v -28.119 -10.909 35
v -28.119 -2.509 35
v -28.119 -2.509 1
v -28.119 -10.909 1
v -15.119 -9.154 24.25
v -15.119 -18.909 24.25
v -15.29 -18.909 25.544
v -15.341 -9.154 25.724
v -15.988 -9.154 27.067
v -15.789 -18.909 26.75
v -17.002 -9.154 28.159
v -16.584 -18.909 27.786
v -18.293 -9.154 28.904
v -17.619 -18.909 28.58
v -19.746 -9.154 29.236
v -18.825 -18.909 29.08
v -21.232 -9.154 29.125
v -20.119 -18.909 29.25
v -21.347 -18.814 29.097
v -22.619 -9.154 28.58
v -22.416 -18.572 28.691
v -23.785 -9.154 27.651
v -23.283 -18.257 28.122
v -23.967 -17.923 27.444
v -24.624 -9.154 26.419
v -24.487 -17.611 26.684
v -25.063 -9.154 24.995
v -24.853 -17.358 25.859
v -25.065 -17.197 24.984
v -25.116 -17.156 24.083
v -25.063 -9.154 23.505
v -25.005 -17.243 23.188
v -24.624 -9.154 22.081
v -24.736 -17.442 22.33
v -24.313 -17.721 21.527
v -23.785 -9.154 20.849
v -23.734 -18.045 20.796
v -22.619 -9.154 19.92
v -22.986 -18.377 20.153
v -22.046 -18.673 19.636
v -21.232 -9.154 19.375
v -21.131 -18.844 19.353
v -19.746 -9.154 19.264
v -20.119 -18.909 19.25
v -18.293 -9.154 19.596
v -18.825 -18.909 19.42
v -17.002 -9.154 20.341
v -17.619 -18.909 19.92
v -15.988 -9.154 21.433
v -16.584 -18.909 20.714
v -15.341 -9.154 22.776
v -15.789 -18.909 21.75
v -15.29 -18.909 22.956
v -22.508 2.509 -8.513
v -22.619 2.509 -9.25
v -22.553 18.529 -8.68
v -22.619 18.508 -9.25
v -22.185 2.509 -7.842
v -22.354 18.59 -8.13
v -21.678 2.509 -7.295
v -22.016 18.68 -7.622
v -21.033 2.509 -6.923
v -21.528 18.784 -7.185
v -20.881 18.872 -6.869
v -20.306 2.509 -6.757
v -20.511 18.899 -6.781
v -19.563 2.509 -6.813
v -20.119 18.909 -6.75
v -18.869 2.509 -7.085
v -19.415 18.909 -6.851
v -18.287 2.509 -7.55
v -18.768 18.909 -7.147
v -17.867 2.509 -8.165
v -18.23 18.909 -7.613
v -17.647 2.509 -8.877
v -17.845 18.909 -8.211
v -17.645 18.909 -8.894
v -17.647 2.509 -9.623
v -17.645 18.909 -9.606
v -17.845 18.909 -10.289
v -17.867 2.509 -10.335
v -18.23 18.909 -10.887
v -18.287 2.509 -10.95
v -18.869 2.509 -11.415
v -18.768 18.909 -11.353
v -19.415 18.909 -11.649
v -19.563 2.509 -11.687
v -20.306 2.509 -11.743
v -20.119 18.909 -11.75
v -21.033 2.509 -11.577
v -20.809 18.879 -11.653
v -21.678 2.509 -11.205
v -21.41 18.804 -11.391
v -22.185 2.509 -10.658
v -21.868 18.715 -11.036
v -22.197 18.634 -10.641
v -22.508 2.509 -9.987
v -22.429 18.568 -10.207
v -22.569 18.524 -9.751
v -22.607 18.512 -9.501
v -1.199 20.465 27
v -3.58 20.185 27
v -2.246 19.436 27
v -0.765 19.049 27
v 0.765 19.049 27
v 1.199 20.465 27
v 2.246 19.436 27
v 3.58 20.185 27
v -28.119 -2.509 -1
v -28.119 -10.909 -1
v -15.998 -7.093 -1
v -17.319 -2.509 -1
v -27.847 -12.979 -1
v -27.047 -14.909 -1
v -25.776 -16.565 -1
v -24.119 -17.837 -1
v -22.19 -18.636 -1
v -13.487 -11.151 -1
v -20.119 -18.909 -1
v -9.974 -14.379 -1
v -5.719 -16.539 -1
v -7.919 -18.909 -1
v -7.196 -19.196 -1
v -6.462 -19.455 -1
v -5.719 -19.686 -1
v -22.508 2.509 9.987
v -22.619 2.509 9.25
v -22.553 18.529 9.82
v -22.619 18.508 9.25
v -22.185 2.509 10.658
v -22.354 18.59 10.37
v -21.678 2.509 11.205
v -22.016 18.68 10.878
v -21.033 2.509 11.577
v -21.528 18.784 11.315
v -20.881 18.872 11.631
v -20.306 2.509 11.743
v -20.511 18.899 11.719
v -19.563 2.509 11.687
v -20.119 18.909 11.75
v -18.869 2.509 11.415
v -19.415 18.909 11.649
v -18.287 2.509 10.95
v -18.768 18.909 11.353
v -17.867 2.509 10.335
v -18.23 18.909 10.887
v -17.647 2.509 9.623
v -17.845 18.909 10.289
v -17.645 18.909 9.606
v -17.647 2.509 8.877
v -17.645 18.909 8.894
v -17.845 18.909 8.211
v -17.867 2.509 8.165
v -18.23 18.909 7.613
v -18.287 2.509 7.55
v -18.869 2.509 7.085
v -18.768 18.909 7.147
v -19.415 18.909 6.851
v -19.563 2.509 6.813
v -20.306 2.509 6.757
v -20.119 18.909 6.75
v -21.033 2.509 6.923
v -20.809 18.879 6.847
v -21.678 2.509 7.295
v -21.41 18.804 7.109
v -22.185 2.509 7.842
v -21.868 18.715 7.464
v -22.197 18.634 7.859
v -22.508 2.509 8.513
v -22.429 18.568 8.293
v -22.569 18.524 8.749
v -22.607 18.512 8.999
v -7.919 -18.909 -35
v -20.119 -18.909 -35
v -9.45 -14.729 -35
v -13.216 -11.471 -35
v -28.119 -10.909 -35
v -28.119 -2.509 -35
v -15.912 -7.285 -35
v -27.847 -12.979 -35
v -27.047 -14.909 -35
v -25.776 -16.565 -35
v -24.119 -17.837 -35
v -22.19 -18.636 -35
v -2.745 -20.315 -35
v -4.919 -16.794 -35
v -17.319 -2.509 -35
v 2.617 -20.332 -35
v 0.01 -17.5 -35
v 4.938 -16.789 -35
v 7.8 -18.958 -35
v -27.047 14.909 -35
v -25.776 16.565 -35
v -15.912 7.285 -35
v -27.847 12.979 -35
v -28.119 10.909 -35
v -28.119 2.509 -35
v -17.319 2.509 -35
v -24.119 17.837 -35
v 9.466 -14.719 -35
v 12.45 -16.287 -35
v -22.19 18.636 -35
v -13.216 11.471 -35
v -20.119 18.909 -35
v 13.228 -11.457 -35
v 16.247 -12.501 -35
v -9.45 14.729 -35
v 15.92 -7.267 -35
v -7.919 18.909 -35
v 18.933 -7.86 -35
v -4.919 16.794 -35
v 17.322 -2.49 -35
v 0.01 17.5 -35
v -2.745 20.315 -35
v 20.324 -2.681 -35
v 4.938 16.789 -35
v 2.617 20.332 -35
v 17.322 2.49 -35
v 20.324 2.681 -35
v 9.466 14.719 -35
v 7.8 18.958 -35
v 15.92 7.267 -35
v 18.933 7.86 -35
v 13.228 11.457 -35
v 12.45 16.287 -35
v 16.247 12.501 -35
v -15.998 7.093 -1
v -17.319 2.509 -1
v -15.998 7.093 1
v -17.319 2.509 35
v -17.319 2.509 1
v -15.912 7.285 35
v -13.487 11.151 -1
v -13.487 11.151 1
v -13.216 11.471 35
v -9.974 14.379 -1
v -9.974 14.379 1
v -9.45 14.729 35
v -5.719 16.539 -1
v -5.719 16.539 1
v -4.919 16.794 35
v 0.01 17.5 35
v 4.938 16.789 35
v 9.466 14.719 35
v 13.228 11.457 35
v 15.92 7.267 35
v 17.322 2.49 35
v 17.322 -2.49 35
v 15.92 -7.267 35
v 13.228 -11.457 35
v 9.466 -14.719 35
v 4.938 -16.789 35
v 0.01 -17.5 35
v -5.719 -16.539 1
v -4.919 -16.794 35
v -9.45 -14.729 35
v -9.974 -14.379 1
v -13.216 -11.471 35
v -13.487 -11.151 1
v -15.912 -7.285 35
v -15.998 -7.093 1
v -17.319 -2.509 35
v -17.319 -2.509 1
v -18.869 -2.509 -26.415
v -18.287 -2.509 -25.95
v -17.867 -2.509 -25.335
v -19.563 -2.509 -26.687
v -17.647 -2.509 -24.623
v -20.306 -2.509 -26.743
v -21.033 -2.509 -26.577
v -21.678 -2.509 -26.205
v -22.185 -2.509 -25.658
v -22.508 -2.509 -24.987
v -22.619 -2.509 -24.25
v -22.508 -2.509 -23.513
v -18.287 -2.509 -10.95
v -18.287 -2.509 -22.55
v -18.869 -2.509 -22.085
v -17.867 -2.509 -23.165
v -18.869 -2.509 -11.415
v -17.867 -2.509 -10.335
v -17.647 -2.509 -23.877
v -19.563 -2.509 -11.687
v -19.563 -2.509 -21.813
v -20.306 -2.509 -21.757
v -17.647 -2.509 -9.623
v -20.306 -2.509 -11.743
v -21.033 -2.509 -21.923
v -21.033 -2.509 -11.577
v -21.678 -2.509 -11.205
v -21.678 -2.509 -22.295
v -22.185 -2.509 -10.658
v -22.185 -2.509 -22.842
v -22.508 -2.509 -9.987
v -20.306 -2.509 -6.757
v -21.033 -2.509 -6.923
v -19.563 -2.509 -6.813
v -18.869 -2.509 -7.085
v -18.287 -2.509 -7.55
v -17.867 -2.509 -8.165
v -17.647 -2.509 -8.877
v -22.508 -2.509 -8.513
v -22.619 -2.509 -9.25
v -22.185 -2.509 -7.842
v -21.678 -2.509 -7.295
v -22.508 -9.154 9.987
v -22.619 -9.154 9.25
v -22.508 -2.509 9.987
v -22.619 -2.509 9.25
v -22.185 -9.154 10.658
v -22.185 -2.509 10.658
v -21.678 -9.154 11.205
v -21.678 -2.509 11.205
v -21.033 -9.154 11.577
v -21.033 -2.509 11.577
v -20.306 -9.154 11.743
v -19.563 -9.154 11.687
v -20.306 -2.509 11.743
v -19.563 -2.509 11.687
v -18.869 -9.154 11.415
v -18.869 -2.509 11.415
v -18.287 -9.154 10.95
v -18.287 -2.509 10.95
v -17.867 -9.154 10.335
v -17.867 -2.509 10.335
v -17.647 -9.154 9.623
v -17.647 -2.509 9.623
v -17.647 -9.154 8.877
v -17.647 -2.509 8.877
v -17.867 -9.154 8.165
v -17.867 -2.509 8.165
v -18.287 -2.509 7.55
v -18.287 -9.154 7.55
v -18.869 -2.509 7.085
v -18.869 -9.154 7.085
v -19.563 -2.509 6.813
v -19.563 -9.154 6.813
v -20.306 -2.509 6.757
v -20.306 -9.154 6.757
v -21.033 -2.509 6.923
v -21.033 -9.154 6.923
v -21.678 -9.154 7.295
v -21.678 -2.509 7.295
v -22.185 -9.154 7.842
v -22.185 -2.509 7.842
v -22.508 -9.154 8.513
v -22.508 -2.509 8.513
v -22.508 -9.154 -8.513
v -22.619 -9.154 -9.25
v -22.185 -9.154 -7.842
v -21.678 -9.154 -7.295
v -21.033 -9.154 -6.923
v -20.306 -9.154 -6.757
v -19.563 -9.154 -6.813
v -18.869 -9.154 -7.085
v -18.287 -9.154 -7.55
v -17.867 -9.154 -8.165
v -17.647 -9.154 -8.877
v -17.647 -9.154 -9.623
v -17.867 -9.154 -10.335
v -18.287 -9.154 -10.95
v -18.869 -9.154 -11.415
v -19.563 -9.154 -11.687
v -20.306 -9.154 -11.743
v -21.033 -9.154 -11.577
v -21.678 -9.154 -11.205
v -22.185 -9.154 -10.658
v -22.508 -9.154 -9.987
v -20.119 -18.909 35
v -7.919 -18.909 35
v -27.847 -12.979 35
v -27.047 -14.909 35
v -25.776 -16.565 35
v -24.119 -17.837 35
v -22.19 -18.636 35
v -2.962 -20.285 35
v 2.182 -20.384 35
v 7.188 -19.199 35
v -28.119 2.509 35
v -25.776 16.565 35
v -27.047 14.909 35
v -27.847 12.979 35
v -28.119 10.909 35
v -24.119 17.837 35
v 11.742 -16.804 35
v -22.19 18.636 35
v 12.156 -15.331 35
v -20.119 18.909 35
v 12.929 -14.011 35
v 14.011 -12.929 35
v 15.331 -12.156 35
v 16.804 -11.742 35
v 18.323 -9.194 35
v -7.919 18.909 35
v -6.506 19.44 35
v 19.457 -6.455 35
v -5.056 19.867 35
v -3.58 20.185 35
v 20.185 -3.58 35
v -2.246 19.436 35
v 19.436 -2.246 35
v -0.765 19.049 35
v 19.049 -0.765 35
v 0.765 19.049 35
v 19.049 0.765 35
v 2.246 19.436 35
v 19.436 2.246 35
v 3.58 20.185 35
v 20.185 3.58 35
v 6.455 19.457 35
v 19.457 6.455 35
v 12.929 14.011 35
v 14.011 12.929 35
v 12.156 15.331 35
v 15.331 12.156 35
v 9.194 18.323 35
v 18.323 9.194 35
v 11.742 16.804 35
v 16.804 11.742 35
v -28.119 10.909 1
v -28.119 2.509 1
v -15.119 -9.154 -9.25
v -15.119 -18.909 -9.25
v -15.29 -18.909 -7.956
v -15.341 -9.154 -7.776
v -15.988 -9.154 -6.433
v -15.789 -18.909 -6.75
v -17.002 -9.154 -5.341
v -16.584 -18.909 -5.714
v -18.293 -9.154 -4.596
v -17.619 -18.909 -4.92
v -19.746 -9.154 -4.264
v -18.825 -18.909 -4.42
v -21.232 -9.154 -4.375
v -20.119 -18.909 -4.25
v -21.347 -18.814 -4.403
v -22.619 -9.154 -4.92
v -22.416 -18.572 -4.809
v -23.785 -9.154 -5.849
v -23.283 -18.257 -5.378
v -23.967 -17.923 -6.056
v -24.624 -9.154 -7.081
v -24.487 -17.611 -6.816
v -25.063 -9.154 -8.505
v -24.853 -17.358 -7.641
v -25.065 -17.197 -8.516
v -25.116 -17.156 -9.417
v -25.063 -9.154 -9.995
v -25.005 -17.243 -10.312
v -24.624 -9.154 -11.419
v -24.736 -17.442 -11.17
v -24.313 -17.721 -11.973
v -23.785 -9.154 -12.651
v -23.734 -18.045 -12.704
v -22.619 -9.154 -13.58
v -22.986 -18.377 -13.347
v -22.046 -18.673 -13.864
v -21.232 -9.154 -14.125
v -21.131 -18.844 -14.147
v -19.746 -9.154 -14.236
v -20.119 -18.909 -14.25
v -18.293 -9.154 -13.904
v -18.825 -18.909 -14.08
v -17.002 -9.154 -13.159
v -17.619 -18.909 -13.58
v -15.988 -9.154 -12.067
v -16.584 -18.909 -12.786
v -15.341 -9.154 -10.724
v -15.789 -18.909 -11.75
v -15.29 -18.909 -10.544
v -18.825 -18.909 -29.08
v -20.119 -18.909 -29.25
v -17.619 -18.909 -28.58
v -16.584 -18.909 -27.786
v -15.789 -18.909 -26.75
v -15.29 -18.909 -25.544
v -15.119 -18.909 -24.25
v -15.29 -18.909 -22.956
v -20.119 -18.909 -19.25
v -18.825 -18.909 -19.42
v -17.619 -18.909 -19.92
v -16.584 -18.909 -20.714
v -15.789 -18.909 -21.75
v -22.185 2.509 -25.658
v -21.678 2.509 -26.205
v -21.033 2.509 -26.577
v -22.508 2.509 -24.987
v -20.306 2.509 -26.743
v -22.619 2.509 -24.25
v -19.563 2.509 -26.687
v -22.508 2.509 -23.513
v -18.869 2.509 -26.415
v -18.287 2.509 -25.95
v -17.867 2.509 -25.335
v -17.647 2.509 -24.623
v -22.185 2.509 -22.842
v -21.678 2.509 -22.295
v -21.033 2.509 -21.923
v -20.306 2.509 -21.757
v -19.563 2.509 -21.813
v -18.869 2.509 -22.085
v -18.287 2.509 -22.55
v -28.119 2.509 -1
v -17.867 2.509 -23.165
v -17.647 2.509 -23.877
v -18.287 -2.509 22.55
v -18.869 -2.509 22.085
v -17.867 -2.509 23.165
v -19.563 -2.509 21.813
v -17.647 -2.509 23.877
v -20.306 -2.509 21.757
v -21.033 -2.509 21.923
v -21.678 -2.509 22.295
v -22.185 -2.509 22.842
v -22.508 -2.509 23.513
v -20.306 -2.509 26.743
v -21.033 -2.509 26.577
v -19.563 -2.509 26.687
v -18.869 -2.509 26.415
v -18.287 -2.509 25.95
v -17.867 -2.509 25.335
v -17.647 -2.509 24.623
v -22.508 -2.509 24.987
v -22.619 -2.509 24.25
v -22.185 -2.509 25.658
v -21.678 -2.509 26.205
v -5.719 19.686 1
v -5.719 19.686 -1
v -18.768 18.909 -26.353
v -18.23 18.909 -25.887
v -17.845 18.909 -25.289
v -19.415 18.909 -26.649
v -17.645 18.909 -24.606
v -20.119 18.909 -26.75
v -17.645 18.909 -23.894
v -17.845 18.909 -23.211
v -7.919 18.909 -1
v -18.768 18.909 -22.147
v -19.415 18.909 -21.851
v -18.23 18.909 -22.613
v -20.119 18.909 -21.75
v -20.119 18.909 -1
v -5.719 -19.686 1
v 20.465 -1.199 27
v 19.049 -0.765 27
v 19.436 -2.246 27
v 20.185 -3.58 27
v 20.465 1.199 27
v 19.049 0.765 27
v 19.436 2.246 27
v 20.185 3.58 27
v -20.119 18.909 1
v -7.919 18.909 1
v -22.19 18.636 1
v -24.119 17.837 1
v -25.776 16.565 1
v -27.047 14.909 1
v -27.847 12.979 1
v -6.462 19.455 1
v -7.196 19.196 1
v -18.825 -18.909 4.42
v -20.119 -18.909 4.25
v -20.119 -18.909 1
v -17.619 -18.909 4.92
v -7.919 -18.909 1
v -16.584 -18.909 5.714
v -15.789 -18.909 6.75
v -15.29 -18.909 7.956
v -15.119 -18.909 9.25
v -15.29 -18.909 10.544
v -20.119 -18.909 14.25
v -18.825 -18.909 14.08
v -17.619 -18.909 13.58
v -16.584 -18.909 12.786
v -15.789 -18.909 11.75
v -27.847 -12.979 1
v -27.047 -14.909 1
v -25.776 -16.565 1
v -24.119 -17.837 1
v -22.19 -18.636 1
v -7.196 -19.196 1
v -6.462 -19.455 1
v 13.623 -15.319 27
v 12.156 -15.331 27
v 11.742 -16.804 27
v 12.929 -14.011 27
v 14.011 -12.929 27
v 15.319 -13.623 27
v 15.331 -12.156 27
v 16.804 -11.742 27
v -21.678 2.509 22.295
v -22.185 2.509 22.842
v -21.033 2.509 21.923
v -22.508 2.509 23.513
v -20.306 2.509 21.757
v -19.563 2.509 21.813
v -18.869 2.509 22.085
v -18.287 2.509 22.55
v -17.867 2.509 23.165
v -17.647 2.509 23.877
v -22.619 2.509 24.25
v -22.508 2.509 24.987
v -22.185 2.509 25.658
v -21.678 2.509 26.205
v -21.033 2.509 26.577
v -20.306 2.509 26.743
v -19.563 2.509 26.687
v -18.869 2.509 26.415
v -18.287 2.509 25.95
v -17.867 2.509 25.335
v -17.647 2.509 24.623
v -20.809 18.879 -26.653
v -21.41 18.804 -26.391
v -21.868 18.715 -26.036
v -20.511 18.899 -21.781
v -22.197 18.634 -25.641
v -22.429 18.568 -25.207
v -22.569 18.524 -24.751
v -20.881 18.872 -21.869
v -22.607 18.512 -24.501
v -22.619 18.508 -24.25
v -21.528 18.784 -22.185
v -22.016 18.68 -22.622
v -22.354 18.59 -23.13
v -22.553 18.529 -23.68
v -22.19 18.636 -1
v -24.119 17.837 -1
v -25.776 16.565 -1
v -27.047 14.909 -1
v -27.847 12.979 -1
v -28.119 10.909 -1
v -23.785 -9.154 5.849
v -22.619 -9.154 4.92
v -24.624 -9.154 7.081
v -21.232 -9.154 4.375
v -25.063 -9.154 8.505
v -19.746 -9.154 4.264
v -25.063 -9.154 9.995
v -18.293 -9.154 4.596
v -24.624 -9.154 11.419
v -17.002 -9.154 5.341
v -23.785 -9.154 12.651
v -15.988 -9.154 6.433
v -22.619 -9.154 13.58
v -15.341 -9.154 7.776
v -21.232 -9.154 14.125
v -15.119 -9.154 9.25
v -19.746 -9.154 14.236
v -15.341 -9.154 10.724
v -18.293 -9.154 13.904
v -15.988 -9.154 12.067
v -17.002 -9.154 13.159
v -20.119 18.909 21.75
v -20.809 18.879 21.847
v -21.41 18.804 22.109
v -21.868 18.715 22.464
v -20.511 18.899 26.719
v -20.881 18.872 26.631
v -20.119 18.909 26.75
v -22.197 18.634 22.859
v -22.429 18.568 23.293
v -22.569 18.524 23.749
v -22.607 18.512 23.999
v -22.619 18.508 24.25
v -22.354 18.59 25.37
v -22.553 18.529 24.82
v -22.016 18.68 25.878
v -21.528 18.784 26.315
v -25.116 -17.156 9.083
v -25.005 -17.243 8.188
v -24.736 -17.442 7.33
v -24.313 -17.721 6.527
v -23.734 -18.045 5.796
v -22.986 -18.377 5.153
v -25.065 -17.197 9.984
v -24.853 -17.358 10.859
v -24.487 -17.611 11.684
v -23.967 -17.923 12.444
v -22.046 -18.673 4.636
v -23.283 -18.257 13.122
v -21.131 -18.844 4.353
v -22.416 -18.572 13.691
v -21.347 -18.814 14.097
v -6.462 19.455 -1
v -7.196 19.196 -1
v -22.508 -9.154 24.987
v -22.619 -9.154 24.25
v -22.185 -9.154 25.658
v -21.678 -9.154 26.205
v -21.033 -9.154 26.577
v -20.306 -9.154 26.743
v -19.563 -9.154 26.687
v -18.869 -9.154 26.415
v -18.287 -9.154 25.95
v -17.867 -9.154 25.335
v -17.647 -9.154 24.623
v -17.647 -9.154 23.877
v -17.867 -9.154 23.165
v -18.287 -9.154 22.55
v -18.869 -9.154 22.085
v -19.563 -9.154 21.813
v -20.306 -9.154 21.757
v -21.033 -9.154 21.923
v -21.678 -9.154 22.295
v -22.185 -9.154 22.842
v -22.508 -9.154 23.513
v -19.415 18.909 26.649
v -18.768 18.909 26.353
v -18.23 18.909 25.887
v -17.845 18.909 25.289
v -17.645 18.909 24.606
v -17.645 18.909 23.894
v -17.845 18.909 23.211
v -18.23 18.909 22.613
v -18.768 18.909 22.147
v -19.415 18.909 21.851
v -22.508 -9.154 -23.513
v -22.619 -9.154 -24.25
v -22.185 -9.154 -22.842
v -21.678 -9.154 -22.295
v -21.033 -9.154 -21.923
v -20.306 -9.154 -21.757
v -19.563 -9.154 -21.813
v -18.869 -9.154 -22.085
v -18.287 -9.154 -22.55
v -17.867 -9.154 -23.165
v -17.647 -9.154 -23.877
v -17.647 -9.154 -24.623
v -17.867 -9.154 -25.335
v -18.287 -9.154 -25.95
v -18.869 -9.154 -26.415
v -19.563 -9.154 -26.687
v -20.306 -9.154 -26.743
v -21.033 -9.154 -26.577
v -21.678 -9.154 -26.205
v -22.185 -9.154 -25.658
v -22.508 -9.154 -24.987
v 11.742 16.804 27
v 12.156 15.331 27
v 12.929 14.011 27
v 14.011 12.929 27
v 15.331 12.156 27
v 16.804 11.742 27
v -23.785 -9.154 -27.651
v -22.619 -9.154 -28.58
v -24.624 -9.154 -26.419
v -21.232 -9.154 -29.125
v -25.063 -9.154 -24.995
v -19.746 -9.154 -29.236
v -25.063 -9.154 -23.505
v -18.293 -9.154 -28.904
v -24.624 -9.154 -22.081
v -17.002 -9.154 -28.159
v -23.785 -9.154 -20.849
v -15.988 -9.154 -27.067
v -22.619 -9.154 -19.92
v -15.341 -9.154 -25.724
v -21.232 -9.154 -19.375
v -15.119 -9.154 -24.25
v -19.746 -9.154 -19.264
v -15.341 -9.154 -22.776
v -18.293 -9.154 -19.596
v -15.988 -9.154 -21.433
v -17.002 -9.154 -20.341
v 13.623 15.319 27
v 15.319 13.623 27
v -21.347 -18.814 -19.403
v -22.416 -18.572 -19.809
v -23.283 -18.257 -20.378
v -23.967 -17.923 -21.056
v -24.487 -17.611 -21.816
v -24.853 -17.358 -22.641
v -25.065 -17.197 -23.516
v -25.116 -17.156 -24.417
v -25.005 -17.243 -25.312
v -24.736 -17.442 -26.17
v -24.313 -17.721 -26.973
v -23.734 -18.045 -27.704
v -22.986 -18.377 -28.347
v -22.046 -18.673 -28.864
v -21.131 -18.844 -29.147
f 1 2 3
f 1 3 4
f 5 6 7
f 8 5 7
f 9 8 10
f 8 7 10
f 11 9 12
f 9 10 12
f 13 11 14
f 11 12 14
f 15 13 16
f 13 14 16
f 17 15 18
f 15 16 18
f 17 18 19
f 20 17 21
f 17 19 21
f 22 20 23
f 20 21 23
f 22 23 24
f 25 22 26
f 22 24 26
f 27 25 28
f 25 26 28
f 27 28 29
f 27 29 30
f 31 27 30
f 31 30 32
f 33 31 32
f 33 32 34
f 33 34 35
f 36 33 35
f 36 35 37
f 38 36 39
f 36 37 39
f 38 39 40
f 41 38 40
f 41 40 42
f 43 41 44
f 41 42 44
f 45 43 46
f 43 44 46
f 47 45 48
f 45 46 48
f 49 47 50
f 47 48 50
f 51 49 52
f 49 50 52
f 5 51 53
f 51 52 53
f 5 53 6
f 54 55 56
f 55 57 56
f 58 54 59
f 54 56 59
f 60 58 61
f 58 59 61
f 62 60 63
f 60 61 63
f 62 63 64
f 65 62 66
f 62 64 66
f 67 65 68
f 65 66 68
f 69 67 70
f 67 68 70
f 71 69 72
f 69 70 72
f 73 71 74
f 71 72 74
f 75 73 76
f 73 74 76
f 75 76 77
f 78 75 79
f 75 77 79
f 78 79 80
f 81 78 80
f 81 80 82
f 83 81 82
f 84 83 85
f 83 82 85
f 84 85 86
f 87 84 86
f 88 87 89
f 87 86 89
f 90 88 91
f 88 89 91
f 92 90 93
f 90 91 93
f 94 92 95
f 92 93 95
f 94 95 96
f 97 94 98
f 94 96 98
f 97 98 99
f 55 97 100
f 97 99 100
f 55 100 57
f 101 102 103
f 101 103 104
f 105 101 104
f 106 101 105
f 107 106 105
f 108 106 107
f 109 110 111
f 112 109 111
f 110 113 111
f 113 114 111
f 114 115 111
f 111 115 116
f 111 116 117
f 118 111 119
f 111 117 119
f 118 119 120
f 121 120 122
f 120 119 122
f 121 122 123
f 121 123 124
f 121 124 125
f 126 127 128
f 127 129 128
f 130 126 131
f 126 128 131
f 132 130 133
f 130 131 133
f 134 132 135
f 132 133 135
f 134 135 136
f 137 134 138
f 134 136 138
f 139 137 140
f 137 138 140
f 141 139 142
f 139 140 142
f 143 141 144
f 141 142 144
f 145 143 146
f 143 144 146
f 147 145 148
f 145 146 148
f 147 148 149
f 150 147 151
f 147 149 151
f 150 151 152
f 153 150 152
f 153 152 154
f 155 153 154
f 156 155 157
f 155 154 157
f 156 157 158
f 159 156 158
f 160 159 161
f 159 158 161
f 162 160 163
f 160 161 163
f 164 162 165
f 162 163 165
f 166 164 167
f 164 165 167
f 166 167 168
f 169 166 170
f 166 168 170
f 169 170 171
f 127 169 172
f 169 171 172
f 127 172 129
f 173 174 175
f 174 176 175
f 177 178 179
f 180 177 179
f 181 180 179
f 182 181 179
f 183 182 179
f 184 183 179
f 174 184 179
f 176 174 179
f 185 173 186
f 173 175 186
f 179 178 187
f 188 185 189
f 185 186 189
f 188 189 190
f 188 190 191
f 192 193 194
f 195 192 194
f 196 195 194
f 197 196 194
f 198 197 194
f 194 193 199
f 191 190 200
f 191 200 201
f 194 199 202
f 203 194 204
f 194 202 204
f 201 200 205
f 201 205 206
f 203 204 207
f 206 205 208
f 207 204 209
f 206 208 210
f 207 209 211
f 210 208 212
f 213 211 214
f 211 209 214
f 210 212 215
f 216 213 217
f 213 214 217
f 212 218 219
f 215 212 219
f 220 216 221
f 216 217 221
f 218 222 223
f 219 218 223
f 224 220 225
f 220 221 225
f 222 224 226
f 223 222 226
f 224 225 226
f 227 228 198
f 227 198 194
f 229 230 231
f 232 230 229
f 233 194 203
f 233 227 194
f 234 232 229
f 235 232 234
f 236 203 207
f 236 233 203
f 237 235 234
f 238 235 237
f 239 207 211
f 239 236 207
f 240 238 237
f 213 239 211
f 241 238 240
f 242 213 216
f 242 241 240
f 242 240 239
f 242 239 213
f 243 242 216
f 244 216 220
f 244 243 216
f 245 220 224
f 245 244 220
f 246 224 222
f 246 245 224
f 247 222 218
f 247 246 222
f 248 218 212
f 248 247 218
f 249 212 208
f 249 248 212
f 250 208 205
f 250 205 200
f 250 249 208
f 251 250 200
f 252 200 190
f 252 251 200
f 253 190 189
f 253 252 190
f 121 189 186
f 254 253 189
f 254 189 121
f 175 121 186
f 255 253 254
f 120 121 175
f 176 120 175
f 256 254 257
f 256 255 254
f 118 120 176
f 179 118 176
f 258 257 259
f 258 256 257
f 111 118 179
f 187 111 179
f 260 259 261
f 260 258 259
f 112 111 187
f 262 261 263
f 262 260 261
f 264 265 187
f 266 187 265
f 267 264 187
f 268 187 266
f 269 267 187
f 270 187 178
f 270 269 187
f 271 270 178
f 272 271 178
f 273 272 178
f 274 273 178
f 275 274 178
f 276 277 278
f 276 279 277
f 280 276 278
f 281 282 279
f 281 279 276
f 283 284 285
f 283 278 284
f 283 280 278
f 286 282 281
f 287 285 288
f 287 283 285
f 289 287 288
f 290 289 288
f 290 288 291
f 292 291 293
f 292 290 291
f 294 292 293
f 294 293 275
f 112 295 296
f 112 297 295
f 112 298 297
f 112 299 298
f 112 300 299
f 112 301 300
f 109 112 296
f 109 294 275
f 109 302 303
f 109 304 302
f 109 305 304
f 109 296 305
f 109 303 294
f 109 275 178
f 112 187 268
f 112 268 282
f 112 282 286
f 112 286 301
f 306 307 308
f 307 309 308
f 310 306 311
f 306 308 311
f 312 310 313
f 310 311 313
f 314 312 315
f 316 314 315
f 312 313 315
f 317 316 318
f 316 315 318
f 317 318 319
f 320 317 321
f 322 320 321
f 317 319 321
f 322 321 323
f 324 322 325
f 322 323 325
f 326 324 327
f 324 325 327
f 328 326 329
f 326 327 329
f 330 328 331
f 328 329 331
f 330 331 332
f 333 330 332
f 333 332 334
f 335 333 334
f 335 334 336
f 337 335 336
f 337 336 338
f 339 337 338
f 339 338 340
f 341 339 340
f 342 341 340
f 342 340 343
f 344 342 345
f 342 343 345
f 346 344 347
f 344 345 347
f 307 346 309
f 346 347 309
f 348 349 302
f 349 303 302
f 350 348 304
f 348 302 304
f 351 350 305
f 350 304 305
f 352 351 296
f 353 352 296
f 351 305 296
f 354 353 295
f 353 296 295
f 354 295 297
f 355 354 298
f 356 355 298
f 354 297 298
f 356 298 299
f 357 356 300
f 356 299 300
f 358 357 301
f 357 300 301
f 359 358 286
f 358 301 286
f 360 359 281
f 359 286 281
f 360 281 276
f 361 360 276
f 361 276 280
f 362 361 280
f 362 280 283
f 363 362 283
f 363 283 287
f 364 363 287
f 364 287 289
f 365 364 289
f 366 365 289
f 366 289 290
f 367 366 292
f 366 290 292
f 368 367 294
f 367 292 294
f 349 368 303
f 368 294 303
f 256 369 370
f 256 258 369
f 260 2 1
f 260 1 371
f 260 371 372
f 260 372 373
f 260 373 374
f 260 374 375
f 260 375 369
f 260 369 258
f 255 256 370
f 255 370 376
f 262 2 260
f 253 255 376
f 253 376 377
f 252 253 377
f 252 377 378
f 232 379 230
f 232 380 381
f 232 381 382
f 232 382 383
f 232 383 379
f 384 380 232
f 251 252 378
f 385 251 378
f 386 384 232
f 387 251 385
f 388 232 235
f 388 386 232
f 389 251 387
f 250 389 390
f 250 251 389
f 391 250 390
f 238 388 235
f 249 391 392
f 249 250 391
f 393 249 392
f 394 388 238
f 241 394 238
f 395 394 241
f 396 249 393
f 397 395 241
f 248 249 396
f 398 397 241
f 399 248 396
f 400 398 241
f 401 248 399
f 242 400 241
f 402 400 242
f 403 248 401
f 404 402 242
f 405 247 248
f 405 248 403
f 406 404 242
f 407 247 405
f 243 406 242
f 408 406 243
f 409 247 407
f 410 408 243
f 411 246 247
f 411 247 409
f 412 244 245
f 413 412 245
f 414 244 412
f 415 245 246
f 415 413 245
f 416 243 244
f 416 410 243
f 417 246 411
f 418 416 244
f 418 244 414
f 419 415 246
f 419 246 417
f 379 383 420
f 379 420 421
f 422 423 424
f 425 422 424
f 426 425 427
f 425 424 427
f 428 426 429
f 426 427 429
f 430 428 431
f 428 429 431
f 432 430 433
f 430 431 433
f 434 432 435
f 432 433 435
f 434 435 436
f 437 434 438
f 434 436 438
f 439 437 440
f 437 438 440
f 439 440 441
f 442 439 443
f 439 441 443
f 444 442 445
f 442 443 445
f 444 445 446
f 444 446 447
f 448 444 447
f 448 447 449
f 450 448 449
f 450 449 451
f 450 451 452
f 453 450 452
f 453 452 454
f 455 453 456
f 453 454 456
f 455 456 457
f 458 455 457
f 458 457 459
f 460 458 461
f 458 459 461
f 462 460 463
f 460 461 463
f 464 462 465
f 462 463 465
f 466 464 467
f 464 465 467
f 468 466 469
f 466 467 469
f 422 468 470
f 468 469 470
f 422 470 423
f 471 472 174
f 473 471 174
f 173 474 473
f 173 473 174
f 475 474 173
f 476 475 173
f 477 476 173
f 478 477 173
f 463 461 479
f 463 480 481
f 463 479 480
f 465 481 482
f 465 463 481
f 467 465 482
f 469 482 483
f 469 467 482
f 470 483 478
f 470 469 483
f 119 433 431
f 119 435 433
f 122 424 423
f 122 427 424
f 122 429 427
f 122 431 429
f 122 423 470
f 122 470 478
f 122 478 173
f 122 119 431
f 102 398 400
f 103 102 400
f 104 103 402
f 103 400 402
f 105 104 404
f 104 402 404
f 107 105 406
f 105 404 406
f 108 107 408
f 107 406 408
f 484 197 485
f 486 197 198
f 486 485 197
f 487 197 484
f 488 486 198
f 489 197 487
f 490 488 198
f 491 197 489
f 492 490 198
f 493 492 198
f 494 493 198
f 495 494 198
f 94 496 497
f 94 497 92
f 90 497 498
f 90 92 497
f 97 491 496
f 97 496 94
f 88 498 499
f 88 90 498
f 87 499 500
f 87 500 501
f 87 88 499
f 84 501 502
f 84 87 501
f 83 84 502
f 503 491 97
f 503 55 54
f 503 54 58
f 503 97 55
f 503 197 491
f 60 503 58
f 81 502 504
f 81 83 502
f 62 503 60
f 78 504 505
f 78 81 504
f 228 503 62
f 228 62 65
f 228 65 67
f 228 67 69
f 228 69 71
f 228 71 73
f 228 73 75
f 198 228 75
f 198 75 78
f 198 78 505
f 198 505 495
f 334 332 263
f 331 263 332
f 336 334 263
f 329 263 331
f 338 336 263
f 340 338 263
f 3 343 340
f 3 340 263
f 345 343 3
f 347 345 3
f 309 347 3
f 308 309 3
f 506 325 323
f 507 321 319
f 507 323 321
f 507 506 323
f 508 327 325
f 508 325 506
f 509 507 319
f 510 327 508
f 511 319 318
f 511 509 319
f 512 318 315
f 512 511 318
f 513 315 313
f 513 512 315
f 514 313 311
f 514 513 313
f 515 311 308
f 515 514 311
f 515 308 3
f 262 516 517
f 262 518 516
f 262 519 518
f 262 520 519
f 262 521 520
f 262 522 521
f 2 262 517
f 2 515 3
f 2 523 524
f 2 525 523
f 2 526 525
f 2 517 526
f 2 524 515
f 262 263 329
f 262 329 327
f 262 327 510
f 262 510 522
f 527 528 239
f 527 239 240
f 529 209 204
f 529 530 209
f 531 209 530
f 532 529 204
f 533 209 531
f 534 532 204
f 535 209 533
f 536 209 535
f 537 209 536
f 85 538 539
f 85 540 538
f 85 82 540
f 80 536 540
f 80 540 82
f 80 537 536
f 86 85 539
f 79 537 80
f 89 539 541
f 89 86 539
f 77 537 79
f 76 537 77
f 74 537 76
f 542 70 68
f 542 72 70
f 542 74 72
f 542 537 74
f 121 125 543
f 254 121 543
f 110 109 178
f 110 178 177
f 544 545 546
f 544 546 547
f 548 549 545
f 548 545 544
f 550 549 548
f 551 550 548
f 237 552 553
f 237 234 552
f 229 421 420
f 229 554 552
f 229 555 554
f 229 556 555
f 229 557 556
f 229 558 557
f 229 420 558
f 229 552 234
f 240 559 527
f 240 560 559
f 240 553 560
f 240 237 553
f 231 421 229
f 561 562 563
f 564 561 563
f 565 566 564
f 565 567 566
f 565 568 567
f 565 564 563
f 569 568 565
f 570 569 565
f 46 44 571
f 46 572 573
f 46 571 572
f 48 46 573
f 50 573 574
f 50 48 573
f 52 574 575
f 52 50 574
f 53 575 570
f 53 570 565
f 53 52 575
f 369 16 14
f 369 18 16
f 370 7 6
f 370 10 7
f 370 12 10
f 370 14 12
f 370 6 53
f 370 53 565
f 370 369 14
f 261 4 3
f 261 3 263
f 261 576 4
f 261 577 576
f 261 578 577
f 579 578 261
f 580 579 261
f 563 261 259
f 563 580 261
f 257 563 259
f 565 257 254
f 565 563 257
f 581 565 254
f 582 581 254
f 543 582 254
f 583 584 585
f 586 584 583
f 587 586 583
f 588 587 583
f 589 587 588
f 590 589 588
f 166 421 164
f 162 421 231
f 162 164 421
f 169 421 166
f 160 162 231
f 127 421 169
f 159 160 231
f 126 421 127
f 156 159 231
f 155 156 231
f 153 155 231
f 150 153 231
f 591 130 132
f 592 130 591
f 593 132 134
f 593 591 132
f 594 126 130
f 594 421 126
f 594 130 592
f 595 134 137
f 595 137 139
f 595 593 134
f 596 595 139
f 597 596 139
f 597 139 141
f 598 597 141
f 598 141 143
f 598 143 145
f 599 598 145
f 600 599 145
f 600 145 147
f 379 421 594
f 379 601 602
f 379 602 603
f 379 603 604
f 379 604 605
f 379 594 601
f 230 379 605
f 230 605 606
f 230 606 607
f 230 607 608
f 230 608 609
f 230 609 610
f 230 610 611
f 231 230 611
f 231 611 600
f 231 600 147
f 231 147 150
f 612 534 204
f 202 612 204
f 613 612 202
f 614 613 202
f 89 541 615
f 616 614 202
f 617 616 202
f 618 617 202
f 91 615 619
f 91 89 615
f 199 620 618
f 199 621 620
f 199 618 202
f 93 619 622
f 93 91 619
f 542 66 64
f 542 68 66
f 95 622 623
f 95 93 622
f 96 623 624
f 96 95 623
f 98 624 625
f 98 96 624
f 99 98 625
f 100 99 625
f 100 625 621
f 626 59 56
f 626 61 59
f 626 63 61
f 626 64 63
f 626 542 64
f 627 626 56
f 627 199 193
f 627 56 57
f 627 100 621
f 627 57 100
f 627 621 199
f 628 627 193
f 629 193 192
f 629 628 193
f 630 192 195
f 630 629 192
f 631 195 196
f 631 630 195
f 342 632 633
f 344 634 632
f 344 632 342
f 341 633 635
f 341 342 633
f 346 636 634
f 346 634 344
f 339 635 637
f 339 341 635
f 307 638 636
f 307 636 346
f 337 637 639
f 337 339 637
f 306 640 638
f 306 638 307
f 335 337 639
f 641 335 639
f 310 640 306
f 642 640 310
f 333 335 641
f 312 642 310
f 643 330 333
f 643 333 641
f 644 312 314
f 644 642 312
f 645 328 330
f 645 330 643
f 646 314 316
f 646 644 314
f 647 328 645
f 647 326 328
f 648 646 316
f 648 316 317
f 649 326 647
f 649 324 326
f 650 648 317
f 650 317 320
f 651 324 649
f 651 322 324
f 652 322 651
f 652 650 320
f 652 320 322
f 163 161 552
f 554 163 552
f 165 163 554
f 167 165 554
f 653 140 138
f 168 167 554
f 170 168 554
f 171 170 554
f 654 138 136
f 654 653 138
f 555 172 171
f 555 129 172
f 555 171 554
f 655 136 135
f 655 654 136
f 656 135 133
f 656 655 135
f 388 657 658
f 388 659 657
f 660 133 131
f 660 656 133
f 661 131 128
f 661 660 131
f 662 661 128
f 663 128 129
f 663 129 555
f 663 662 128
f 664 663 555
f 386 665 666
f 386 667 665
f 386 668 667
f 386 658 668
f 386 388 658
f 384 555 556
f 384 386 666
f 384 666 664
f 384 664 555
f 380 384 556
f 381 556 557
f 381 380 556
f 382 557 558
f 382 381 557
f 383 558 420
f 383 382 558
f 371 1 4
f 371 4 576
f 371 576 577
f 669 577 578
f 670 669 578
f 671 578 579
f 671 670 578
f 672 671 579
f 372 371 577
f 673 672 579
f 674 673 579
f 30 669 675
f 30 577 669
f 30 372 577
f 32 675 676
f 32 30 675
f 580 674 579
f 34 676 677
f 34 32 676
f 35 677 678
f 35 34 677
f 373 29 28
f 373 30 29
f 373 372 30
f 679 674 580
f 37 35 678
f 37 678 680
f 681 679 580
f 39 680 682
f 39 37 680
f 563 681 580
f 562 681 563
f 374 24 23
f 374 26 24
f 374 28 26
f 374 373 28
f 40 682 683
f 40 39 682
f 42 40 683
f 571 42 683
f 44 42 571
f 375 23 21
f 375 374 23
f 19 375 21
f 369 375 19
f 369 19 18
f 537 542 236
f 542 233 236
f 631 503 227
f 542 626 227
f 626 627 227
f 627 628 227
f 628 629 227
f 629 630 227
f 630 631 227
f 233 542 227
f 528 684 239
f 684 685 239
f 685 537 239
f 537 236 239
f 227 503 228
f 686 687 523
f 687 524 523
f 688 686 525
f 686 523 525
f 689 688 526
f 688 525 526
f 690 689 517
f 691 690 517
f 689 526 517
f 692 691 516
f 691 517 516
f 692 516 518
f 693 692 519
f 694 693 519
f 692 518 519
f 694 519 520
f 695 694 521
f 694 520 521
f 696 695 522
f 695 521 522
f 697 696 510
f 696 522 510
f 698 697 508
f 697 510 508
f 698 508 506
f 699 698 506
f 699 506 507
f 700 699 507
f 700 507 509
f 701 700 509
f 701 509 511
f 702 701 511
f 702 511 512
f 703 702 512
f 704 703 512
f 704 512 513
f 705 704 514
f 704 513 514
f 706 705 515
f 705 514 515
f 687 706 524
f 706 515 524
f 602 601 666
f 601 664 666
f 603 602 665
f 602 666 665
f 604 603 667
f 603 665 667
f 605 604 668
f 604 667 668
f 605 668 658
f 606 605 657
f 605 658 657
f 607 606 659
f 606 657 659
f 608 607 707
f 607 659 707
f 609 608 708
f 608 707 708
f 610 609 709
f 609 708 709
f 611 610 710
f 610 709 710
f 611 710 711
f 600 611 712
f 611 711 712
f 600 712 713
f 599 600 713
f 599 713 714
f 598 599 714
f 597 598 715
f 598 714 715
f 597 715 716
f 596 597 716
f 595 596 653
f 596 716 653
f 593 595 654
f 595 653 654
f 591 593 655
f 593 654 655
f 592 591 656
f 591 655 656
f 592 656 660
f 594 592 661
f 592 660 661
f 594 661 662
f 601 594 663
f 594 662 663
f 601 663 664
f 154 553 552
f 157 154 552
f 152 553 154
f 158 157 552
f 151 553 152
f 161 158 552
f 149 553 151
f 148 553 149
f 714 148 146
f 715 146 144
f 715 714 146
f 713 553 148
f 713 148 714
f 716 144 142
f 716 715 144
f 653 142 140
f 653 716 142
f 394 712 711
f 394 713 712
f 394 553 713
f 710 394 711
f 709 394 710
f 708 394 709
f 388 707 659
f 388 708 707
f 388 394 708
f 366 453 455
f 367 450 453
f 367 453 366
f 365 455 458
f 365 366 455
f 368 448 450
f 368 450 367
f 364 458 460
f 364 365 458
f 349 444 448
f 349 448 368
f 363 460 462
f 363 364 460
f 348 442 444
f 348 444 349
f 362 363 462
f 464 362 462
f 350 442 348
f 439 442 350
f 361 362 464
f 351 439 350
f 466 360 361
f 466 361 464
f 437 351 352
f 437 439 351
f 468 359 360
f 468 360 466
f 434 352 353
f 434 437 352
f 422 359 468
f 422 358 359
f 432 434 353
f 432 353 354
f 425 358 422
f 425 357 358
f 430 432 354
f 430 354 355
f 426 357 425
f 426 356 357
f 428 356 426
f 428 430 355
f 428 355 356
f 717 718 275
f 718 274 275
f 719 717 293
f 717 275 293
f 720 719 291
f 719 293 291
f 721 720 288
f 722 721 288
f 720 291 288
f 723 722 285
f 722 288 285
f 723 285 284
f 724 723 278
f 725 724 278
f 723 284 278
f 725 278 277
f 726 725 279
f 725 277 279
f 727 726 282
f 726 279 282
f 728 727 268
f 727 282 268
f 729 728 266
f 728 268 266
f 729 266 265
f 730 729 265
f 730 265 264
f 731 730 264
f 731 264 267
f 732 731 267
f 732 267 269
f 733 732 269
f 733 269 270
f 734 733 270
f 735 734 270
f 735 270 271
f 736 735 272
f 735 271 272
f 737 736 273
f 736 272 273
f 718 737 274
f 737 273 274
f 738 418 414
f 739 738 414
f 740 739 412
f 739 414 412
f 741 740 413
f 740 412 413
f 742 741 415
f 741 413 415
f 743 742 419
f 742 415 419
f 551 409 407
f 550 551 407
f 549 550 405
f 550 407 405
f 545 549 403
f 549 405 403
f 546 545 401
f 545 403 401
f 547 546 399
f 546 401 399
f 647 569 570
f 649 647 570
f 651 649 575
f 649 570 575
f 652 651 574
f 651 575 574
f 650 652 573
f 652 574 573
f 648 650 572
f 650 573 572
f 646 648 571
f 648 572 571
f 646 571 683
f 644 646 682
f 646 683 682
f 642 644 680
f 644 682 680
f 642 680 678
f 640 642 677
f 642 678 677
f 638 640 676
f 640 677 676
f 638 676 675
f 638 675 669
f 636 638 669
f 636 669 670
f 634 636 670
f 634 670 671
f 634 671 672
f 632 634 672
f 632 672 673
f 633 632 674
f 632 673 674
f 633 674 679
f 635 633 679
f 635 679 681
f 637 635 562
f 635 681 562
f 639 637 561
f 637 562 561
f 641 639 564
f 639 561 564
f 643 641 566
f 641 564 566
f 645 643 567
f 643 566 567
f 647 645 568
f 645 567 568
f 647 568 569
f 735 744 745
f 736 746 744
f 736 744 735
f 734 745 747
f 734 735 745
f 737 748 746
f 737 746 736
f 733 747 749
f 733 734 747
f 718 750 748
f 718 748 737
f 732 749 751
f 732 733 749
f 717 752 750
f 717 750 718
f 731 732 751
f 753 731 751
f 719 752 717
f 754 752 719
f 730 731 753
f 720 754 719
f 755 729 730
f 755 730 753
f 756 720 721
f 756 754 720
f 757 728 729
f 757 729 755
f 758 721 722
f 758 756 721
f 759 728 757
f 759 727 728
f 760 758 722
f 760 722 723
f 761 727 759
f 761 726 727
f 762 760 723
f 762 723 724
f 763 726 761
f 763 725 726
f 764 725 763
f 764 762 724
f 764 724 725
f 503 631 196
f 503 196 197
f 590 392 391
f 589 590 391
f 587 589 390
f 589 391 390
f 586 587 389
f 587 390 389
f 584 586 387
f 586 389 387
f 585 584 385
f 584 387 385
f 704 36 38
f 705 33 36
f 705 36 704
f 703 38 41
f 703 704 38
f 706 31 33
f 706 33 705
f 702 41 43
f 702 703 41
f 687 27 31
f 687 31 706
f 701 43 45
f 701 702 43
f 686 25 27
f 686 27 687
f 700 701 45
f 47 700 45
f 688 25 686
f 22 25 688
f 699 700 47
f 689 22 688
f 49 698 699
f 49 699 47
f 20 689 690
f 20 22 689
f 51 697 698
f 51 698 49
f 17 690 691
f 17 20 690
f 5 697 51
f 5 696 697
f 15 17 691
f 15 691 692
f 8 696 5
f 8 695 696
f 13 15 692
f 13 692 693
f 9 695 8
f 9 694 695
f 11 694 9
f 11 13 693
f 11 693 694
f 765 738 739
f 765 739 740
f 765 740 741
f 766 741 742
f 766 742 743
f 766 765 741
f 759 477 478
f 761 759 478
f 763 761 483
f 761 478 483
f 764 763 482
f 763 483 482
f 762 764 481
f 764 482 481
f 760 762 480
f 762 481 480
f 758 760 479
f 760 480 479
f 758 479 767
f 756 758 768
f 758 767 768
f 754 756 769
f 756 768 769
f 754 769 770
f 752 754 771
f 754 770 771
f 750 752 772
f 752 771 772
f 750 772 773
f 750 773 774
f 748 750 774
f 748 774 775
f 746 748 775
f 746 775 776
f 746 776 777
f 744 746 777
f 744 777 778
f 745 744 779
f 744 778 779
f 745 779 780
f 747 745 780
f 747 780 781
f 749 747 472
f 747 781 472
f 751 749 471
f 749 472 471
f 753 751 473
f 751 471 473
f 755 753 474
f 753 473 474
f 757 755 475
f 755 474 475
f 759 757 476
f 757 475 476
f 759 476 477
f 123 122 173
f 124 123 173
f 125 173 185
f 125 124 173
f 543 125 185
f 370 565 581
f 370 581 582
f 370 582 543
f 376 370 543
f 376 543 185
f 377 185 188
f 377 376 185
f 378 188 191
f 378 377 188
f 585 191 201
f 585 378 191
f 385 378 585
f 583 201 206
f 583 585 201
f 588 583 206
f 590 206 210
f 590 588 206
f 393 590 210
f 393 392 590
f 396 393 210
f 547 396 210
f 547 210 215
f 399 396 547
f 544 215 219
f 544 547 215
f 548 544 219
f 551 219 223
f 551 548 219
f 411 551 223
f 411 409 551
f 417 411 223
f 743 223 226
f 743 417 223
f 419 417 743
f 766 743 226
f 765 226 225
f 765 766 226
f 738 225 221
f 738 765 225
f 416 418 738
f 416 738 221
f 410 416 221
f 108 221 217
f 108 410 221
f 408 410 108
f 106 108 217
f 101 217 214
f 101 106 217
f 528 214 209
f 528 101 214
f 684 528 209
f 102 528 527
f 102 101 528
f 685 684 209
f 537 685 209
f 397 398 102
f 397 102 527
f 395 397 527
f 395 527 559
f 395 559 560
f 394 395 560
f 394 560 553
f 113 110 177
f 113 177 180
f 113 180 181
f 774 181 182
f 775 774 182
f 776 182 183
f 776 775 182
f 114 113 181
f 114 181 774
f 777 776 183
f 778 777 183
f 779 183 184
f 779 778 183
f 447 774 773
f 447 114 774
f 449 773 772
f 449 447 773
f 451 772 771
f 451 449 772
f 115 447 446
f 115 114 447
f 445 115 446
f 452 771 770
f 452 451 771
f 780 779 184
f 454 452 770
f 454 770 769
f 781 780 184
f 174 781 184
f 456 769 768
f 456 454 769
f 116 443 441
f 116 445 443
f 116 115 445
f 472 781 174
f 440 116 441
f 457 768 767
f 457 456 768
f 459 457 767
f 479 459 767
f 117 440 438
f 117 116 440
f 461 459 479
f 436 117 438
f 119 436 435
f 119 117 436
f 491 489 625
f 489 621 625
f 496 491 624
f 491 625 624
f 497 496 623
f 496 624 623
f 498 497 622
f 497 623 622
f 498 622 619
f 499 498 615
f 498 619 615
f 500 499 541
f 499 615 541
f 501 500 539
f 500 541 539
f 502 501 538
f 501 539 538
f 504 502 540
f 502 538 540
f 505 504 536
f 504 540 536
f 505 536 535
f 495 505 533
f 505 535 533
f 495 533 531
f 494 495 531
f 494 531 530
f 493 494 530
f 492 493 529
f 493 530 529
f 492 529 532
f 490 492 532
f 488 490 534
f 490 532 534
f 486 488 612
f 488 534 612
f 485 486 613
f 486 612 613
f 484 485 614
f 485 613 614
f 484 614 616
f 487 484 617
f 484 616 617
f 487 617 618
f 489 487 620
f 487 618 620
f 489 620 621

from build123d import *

# Parameters (mm, degrees)
F1_DEPTH       = 35
F3_D           = 5
F3_START       = 1.7550021
F3_CBORE_D     = 10
F3_CBORE_DEPTH = 8
F4_W           = 22.4
F4_H           = 2
F5_DEPTH       = 25
F7_DEPTH       = 8


with BuildPart() as f1:
    # F0 (on Top) → F1 (new body, symmetric)
    with BuildSketch(Plane.XY):
        with BuildLine():
            ThreePointArc((-17.3192642082, 2.5086026559), (17.5, 0), (-17.3192642082, -2.5086026559))
            Line((-17.3192642082, -2.5086026559), (-28.1192642082, -2.5086026559))
            Line((-28.1192642082, -2.5086026559), (-28.1192642082, -10.9086026559))
            ThreePointArc((-28.1192642082, -10.9086026559), (-25.7761184577, -16.5654569054), (-20.1192642082, -18.9086026559))
            Line((-20.1192642082, -18.9086026559), (-7.9192642082, -18.9086026559))
            ThreePointArc((-7.9192642082, -18.9086026559), (20.5, 0), (-7.9192642082, 18.9086026559))
            Line((-7.9192642082, 18.9086026559), (-20.1192642082, 18.9086026559))
            ThreePointArc((-20.1192642082, 18.9086026559), (-25.7761184577, 16.5654569054), (-28.1192642082, 10.9086026559))
            Line((-28.1192642082, 10.9086026559), (-28.1192642082, 2.5086026559))
            Line((-28.1192642082, 2.5086026559), (-17.3192642082, 2.5086026559))
        make_face()
    extrude(amount=F1_DEPTH, both=True)

    # F3 (through all)
    # its depths count from where the whole tool has entered the part; down to there all is cleared
    with Locations(Plane.XZ.offset(18.9086026559).offset(-F3_START)):
        with Locations((-20.1192642082, 24.25), (-20.1192642082, 9.25), (-20.1192642082, -9.25), (-20.1192642082, -24.25)):
            CounterBoreHole(F3_D / 2, F3_CBORE_D / 2, F3_CBORE_DEPTH)

    # F4 (on Front) → F5 (cut, symmetric)
    with BuildSketch(Plane.XZ):
        with Locations((-16.9192642082, 0)):
            Rectangle(F4_W, F4_H)
    extrude(amount=F5_DEPTH, both=True, mode=Mode.SUBTRACT)

    # F6 (on face) → F7 (cut)
    with BuildSketch(Plane.XY.offset(35)):
        with BuildLine():
            ThreePointArc((16.8043309304, -11.7415698261), (14.4956890143, -14.4956890143), (11.7415698261, -16.8043309304))
            ThreePointArc((11.7415698261, -16.8043309304), (17.2398329286, -23.6616731318), (23.6776695297, -17.6776695297))
            ThreePointArc((23.6776695297, -17.6776695297), (21.5994018258, -13.1367427743), (16.8043309304, -11.7415698261))
        make_face()
        with BuildLine():
            ThreePointArc((16.8043309304, -11.7415698261), (13.4350288425, -13.4350288425), (11.7415698261, -16.8043309304))
            ThreePointArc((11.7415698261, -16.8043309304), (14.4956890143, -14.4956890143), (16.8043309304, -11.7415698261))
        make_face()
        with BuildLine():
            ThreePointArc((20.185, 3.5799127084), (20.5, 0), (20.185, -3.5799127084))
            ThreePointArc((20.185, -3.5799127084), (26.8854707635, -5.6960512638), (31, 0))
            ThreePointArc((31, 0), (26.8854707635, 5.6960512638), (20.185, 3.5799127084))
        make_face()
        with BuildLine():
            ThreePointArc((20.185, 3.5799127084), (19, 0), (20.185, -3.5799127084))
            ThreePointArc((20.185, -3.5799127084), (20.5, 0), (20.185, 3.5799127084))
        make_face()
        with BuildLine():
            ThreePointArc((11.7415698261, 16.8043309304), (14.4956890143, 14.4956890143), (16.8043309304, 11.7415698261))
            ThreePointArc((16.8043309304, 11.7415698261), (21.5994018258, 13.1367427743), (23.6776695297, 17.6776695297))
            ThreePointArc((23.6776695297, 17.6776695297), (17.2398329286, 23.6616731318), (11.7415698261, 16.8043309304))
        make_face()
        with BuildLine():
            ThreePointArc((11.7415698261, 16.8043309304), (13.4350288425, 13.4350288425), (16.8043309304, 11.7415698261))
            ThreePointArc((16.8043309304, 11.7415698261), (14.4956890143, 14.4956890143), (11.7415698261, 16.8043309304))
        make_face()
        with BuildLine():
            ThreePointArc((-3.5799127084, 20.185), (0, 20.5), (3.5799127084, 20.185))
            ThreePointArc((3.5799127084, 20.185), (5.3609456372, 22.305512688), (6, 25))
            ThreePointArc((6, 25), (-2.694487312, 30.3609456372), (-3.5799127084, 20.185))
        make_face()
        with BuildLine():
            ThreePointArc((-3.5799127084, 20.185), (0, 19), (3.5799127084, 20.185))
            ThreePointArc((3.5799127084, 20.185), (0, 20.5), (-3.5799127084, 20.185))
        make_face()
    extrude(amount=-F7_DEPTH, mode=Mode.SUBTRACT)


solid = f1.part
